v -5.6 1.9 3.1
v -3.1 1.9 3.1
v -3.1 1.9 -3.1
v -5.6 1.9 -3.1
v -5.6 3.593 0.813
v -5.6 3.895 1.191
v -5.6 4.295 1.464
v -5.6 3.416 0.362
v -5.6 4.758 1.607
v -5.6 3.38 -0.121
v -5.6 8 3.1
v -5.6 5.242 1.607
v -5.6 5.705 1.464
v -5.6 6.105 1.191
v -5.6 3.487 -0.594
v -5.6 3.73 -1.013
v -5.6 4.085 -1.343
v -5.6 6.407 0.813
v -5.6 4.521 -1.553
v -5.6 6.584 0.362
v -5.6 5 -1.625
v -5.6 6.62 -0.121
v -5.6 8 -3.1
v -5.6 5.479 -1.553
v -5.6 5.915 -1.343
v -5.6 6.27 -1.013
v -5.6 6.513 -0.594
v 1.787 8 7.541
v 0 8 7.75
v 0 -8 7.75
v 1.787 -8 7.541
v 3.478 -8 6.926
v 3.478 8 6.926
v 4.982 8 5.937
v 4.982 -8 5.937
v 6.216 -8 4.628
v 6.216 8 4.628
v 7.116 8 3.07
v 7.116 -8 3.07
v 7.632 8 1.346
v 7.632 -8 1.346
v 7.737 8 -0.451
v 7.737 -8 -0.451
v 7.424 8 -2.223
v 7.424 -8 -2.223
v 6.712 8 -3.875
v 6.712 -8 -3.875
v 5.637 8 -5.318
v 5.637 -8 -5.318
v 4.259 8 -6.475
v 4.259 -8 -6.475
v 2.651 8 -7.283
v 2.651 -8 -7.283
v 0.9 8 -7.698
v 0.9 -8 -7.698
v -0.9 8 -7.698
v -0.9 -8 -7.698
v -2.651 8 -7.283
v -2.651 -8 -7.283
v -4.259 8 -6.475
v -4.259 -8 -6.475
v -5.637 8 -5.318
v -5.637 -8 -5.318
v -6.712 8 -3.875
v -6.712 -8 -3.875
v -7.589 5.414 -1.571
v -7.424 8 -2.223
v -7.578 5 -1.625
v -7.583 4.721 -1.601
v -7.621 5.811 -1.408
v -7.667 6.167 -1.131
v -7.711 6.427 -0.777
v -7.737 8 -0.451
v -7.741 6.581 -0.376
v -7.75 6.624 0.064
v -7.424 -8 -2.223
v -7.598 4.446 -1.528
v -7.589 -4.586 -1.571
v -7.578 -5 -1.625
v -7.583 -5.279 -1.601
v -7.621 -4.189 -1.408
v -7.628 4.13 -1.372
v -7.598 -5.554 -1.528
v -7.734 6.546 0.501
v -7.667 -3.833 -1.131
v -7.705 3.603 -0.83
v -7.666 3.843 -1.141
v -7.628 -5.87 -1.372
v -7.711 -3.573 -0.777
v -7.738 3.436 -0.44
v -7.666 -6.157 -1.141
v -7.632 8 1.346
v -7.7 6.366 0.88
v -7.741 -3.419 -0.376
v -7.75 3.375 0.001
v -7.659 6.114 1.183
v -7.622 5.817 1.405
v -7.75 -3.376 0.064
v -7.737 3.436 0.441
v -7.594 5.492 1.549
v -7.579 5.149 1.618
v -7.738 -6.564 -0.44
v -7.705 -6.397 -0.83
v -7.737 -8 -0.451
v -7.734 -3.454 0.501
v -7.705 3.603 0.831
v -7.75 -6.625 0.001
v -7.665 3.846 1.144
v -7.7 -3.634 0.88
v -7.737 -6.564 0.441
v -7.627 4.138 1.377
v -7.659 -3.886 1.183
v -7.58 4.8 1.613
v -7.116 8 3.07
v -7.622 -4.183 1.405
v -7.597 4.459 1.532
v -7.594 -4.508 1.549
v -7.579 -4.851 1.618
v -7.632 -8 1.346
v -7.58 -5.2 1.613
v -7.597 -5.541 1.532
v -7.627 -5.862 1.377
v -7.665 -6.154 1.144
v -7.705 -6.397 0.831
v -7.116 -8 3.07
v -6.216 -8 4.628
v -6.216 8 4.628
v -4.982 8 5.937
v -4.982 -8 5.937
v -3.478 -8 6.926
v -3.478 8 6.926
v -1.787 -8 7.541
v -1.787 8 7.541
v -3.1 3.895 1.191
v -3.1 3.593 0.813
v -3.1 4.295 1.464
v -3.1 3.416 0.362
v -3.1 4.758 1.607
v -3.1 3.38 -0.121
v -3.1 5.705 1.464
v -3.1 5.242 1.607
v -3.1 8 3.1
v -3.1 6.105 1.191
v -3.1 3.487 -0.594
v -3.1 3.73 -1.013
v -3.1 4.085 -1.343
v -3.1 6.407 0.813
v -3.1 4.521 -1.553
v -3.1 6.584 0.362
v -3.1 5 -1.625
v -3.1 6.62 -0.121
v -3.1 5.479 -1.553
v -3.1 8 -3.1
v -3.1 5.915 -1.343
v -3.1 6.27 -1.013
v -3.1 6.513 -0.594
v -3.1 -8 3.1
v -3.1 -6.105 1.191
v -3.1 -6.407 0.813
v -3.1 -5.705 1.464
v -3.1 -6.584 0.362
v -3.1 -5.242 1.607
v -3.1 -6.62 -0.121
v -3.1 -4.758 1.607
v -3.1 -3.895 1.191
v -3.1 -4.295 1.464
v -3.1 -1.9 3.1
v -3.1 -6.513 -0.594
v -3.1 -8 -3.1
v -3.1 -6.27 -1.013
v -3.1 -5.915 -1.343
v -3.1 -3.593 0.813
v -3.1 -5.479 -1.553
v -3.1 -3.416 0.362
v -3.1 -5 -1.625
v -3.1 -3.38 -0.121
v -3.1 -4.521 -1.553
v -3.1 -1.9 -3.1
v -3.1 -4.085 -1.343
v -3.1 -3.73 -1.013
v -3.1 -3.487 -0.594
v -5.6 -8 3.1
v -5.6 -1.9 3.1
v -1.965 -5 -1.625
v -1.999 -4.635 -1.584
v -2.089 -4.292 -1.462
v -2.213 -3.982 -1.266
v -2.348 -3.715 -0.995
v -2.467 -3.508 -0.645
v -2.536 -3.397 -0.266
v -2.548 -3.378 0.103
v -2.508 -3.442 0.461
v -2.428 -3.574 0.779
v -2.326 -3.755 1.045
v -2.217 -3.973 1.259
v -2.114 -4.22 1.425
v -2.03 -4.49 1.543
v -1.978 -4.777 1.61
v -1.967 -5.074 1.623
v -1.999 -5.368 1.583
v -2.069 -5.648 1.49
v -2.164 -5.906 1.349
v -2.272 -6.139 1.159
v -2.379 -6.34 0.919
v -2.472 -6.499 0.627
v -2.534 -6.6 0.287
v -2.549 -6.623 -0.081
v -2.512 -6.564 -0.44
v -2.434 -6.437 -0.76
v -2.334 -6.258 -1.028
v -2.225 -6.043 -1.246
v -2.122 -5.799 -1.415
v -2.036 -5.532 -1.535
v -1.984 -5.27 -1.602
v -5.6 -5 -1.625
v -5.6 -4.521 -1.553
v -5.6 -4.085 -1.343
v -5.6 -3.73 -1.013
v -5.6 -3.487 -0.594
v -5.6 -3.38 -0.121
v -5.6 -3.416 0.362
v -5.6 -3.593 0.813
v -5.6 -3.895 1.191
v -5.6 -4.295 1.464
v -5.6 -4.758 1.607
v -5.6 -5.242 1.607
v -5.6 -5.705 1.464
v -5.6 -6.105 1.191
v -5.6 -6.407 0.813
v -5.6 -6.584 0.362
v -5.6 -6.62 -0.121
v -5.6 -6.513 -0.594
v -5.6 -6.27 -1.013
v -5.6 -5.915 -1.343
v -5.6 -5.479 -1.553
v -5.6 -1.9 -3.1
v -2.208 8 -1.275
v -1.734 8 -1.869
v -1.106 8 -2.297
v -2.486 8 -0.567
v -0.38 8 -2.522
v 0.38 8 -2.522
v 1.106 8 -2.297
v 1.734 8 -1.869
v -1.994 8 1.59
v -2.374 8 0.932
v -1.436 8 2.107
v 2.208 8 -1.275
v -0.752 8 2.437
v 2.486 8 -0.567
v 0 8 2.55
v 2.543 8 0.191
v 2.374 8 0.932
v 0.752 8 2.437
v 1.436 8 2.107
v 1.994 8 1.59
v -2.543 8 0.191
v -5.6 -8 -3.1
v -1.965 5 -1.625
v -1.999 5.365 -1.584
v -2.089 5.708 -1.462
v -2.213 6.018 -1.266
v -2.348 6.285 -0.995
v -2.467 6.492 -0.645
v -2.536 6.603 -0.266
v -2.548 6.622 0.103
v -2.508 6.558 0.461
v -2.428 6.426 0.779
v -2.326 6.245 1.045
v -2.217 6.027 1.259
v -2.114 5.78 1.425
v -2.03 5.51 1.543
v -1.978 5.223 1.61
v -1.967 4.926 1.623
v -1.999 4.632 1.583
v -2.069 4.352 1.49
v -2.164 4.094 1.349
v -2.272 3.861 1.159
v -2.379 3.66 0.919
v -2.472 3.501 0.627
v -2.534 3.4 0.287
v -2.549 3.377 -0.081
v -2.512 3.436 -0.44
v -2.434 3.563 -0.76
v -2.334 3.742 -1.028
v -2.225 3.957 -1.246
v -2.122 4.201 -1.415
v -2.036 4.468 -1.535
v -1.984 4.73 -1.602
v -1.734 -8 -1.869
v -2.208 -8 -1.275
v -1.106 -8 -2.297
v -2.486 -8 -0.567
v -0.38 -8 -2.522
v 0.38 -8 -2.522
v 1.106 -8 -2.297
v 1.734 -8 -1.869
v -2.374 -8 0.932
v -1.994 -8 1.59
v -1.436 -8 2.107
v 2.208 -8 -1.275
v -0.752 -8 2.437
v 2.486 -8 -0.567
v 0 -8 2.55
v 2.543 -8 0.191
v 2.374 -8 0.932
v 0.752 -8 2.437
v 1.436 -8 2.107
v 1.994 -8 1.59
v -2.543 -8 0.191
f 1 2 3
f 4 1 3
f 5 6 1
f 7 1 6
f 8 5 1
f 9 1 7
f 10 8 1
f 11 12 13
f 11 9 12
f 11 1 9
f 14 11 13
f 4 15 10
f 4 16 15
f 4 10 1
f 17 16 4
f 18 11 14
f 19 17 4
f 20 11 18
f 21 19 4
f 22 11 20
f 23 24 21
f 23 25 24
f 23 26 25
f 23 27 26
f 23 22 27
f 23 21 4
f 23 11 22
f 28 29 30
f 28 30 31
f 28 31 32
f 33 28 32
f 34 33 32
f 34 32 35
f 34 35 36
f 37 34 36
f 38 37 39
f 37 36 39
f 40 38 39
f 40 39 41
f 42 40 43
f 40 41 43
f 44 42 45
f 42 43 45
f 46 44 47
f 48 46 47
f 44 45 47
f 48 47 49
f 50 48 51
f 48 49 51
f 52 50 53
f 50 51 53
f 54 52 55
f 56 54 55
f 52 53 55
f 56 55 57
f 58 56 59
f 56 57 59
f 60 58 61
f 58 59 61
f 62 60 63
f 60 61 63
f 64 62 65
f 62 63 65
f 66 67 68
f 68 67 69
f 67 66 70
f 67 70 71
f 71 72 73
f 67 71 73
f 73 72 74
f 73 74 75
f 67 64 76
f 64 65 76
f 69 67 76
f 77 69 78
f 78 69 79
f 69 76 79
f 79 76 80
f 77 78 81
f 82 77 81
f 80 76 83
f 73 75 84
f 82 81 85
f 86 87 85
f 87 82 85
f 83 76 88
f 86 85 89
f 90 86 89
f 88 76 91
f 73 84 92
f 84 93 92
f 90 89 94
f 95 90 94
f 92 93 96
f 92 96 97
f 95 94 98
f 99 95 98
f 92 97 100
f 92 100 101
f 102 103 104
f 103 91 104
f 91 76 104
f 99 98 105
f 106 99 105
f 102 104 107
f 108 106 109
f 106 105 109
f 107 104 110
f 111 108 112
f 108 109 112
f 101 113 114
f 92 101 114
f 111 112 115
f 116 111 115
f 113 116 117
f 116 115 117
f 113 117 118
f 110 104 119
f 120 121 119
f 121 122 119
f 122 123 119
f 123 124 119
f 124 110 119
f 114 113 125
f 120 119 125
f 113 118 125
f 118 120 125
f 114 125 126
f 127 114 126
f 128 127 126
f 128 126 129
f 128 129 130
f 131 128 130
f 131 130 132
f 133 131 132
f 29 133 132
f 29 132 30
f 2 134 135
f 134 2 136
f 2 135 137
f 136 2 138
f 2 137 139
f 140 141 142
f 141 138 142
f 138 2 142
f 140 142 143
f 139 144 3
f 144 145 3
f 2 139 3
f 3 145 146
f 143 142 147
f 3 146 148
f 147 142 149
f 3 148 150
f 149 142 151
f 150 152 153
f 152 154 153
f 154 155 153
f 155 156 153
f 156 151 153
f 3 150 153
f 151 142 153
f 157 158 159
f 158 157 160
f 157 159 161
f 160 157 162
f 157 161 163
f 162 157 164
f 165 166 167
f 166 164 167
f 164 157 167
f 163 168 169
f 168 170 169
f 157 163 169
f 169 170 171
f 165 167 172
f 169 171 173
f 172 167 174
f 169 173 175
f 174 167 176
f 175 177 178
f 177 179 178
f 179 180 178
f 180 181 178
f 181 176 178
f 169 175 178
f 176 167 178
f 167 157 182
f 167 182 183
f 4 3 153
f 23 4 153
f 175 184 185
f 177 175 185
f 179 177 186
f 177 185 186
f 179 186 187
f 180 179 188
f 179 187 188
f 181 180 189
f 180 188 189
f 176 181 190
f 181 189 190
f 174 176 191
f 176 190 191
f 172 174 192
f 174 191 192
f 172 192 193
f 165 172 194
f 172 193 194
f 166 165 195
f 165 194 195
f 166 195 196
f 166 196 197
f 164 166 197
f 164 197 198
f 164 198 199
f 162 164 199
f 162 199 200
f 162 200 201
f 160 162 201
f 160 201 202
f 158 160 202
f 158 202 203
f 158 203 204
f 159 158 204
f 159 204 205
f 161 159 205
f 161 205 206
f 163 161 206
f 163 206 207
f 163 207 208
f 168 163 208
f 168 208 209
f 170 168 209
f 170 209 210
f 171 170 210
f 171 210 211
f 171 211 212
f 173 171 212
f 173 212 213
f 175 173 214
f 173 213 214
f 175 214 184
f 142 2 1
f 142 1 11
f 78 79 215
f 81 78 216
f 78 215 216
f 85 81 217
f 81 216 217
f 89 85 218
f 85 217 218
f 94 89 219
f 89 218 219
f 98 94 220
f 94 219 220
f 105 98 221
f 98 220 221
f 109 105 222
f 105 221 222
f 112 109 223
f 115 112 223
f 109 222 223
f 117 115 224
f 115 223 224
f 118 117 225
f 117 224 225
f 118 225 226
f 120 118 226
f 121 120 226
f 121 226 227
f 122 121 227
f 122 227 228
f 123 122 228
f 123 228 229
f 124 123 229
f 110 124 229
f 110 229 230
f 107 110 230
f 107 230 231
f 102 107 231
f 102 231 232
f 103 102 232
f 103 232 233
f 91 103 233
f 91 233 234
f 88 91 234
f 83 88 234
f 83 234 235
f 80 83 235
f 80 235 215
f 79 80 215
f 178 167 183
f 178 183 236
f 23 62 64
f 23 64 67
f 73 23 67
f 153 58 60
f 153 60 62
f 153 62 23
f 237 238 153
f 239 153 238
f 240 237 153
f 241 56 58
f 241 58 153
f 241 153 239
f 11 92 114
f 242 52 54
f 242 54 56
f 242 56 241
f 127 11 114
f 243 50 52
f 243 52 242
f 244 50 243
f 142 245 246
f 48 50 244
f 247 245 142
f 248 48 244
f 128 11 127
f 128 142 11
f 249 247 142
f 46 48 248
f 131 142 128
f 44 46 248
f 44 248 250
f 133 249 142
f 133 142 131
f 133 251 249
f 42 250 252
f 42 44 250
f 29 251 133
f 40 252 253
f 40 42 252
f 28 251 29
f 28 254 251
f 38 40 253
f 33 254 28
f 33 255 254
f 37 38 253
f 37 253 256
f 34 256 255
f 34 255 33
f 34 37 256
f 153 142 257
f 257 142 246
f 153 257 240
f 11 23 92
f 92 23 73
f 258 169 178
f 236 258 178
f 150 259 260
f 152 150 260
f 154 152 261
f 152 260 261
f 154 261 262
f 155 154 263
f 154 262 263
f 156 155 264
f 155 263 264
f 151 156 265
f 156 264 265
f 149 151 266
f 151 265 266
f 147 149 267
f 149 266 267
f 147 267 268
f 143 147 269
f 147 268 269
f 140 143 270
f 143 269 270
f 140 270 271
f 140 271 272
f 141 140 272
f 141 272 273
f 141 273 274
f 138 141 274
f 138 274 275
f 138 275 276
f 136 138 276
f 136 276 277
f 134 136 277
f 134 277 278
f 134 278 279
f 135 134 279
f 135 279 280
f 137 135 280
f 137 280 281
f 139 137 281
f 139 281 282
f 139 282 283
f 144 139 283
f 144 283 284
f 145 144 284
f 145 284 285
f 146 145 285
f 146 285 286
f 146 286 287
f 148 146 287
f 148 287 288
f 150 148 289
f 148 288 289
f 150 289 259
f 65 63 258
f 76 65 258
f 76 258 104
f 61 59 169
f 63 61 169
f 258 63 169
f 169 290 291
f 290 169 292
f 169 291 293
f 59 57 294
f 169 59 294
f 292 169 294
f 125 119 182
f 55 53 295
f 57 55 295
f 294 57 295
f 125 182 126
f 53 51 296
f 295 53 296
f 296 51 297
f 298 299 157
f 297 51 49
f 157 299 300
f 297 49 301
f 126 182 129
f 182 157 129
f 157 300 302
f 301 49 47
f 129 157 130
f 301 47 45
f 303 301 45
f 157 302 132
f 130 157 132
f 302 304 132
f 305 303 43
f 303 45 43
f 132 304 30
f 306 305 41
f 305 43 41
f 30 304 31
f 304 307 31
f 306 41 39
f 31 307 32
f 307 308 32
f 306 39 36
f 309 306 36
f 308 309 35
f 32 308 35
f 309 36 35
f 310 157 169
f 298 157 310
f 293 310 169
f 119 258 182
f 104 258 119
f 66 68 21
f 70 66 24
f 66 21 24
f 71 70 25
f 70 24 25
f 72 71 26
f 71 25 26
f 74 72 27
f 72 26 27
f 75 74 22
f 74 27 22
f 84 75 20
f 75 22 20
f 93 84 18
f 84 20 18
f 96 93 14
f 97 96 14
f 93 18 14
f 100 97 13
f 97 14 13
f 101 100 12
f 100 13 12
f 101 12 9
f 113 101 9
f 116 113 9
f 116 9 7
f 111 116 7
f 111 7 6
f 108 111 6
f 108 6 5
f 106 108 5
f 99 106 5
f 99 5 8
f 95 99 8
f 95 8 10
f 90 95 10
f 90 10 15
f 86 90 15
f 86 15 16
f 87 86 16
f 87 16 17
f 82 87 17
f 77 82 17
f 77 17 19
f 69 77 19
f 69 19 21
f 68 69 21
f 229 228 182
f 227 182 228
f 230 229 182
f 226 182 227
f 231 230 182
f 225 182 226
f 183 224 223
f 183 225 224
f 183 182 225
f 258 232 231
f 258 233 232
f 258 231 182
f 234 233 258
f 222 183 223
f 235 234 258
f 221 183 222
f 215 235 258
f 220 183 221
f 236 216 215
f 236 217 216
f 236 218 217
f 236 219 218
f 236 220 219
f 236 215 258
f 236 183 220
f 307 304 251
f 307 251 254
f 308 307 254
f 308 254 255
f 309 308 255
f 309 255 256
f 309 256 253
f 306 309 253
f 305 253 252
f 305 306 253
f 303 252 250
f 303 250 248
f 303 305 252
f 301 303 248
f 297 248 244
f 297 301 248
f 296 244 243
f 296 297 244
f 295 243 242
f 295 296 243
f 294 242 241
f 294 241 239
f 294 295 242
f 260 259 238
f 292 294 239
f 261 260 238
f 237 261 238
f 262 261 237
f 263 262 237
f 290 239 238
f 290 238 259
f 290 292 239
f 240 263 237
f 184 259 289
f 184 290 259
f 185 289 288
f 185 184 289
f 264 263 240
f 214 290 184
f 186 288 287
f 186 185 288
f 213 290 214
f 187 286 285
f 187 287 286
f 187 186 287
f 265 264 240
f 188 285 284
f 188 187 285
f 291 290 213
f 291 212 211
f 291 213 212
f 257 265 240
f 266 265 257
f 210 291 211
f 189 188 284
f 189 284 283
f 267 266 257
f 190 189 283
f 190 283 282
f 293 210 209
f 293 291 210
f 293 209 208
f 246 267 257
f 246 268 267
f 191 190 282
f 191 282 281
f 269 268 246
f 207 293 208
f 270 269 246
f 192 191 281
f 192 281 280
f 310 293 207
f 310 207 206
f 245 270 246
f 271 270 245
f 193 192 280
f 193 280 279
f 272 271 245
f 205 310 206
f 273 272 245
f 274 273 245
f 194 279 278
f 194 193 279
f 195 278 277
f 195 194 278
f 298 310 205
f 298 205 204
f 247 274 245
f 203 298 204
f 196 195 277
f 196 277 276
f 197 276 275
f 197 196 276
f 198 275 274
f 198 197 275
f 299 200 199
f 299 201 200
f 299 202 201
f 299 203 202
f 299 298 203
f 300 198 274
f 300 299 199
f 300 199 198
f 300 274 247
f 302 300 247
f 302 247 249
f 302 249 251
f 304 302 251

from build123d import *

# Parameters (mm, degrees)
BOSS_EXTRUDE2_DEPTH      = 8
BOSS_EXTRUDE2_DEPTH_BACK = 8
SKETCH1_R                = 7.75
SKETCH1_R_2              = 2.55
SKETCH2_R                = 1.625
CUT_EXTRUDE1_DEPTH       = 20.5
CUT_EXTRUDE2_START       = -3.1
SKETCH4_W                = 6.2
SKETCH4_H                = 6.1
CUT_EXTRUDE2_DEPTH       = 2.5


with BuildPart() as part:
    # Sketch1 → Boss-Extrude2 (new, two sides: drawn at the far end of the back side and taken through both)
    with BuildSketch(Plane(origin=(0, 0, 0), x_dir=(1, 0, 0), z_dir=(0, 1, 0)).offset(-BOSS_EXTRUDE2_DEPTH_BACK)):
        Circle(SKETCH1_R)
        Circle(SKETCH1_R_2, mode=Mode.SUBTRACT)
    extrude(amount=BOSS_EXTRUDE2_DEPTH + BOSS_EXTRUDE2_DEPTH_BACK)

    # Sketch2 → Cut-Extrude1 (cut)
    with BuildSketch(Plane(origin=(0, 0, 0), x_dir=(0, 0, -1), z_dir=(1, 0, 0))):
        with Locations((0, 5)):
            Circle(SKETCH2_R)
        with Locations((0, -5)):
            Circle(SKETCH2_R)
    extrude(amount=-CUT_EXTRUDE1_DEPTH, mode=Mode.SUBTRACT)

    # Sketch4 → Cut-Extrude2 (cut)
    with BuildSketch(Plane(origin=(0, 0, 0), x_dir=(0, 0, -1), z_dir=(1, 0, 0)).offset(CUT_EXTRUDE2_START)):
        with Locations((0, 4.95)):
            Rectangle(SKETCH4_W, SKETCH4_H)
        with Locations((0, -4.95)):
            Rectangle(SKETCH4_W, SKETCH4_H)
    extrude(amount=-CUT_EXTRUDE2_DEPTH, mode=Mode.SUBTRACT)


solid = part.part
